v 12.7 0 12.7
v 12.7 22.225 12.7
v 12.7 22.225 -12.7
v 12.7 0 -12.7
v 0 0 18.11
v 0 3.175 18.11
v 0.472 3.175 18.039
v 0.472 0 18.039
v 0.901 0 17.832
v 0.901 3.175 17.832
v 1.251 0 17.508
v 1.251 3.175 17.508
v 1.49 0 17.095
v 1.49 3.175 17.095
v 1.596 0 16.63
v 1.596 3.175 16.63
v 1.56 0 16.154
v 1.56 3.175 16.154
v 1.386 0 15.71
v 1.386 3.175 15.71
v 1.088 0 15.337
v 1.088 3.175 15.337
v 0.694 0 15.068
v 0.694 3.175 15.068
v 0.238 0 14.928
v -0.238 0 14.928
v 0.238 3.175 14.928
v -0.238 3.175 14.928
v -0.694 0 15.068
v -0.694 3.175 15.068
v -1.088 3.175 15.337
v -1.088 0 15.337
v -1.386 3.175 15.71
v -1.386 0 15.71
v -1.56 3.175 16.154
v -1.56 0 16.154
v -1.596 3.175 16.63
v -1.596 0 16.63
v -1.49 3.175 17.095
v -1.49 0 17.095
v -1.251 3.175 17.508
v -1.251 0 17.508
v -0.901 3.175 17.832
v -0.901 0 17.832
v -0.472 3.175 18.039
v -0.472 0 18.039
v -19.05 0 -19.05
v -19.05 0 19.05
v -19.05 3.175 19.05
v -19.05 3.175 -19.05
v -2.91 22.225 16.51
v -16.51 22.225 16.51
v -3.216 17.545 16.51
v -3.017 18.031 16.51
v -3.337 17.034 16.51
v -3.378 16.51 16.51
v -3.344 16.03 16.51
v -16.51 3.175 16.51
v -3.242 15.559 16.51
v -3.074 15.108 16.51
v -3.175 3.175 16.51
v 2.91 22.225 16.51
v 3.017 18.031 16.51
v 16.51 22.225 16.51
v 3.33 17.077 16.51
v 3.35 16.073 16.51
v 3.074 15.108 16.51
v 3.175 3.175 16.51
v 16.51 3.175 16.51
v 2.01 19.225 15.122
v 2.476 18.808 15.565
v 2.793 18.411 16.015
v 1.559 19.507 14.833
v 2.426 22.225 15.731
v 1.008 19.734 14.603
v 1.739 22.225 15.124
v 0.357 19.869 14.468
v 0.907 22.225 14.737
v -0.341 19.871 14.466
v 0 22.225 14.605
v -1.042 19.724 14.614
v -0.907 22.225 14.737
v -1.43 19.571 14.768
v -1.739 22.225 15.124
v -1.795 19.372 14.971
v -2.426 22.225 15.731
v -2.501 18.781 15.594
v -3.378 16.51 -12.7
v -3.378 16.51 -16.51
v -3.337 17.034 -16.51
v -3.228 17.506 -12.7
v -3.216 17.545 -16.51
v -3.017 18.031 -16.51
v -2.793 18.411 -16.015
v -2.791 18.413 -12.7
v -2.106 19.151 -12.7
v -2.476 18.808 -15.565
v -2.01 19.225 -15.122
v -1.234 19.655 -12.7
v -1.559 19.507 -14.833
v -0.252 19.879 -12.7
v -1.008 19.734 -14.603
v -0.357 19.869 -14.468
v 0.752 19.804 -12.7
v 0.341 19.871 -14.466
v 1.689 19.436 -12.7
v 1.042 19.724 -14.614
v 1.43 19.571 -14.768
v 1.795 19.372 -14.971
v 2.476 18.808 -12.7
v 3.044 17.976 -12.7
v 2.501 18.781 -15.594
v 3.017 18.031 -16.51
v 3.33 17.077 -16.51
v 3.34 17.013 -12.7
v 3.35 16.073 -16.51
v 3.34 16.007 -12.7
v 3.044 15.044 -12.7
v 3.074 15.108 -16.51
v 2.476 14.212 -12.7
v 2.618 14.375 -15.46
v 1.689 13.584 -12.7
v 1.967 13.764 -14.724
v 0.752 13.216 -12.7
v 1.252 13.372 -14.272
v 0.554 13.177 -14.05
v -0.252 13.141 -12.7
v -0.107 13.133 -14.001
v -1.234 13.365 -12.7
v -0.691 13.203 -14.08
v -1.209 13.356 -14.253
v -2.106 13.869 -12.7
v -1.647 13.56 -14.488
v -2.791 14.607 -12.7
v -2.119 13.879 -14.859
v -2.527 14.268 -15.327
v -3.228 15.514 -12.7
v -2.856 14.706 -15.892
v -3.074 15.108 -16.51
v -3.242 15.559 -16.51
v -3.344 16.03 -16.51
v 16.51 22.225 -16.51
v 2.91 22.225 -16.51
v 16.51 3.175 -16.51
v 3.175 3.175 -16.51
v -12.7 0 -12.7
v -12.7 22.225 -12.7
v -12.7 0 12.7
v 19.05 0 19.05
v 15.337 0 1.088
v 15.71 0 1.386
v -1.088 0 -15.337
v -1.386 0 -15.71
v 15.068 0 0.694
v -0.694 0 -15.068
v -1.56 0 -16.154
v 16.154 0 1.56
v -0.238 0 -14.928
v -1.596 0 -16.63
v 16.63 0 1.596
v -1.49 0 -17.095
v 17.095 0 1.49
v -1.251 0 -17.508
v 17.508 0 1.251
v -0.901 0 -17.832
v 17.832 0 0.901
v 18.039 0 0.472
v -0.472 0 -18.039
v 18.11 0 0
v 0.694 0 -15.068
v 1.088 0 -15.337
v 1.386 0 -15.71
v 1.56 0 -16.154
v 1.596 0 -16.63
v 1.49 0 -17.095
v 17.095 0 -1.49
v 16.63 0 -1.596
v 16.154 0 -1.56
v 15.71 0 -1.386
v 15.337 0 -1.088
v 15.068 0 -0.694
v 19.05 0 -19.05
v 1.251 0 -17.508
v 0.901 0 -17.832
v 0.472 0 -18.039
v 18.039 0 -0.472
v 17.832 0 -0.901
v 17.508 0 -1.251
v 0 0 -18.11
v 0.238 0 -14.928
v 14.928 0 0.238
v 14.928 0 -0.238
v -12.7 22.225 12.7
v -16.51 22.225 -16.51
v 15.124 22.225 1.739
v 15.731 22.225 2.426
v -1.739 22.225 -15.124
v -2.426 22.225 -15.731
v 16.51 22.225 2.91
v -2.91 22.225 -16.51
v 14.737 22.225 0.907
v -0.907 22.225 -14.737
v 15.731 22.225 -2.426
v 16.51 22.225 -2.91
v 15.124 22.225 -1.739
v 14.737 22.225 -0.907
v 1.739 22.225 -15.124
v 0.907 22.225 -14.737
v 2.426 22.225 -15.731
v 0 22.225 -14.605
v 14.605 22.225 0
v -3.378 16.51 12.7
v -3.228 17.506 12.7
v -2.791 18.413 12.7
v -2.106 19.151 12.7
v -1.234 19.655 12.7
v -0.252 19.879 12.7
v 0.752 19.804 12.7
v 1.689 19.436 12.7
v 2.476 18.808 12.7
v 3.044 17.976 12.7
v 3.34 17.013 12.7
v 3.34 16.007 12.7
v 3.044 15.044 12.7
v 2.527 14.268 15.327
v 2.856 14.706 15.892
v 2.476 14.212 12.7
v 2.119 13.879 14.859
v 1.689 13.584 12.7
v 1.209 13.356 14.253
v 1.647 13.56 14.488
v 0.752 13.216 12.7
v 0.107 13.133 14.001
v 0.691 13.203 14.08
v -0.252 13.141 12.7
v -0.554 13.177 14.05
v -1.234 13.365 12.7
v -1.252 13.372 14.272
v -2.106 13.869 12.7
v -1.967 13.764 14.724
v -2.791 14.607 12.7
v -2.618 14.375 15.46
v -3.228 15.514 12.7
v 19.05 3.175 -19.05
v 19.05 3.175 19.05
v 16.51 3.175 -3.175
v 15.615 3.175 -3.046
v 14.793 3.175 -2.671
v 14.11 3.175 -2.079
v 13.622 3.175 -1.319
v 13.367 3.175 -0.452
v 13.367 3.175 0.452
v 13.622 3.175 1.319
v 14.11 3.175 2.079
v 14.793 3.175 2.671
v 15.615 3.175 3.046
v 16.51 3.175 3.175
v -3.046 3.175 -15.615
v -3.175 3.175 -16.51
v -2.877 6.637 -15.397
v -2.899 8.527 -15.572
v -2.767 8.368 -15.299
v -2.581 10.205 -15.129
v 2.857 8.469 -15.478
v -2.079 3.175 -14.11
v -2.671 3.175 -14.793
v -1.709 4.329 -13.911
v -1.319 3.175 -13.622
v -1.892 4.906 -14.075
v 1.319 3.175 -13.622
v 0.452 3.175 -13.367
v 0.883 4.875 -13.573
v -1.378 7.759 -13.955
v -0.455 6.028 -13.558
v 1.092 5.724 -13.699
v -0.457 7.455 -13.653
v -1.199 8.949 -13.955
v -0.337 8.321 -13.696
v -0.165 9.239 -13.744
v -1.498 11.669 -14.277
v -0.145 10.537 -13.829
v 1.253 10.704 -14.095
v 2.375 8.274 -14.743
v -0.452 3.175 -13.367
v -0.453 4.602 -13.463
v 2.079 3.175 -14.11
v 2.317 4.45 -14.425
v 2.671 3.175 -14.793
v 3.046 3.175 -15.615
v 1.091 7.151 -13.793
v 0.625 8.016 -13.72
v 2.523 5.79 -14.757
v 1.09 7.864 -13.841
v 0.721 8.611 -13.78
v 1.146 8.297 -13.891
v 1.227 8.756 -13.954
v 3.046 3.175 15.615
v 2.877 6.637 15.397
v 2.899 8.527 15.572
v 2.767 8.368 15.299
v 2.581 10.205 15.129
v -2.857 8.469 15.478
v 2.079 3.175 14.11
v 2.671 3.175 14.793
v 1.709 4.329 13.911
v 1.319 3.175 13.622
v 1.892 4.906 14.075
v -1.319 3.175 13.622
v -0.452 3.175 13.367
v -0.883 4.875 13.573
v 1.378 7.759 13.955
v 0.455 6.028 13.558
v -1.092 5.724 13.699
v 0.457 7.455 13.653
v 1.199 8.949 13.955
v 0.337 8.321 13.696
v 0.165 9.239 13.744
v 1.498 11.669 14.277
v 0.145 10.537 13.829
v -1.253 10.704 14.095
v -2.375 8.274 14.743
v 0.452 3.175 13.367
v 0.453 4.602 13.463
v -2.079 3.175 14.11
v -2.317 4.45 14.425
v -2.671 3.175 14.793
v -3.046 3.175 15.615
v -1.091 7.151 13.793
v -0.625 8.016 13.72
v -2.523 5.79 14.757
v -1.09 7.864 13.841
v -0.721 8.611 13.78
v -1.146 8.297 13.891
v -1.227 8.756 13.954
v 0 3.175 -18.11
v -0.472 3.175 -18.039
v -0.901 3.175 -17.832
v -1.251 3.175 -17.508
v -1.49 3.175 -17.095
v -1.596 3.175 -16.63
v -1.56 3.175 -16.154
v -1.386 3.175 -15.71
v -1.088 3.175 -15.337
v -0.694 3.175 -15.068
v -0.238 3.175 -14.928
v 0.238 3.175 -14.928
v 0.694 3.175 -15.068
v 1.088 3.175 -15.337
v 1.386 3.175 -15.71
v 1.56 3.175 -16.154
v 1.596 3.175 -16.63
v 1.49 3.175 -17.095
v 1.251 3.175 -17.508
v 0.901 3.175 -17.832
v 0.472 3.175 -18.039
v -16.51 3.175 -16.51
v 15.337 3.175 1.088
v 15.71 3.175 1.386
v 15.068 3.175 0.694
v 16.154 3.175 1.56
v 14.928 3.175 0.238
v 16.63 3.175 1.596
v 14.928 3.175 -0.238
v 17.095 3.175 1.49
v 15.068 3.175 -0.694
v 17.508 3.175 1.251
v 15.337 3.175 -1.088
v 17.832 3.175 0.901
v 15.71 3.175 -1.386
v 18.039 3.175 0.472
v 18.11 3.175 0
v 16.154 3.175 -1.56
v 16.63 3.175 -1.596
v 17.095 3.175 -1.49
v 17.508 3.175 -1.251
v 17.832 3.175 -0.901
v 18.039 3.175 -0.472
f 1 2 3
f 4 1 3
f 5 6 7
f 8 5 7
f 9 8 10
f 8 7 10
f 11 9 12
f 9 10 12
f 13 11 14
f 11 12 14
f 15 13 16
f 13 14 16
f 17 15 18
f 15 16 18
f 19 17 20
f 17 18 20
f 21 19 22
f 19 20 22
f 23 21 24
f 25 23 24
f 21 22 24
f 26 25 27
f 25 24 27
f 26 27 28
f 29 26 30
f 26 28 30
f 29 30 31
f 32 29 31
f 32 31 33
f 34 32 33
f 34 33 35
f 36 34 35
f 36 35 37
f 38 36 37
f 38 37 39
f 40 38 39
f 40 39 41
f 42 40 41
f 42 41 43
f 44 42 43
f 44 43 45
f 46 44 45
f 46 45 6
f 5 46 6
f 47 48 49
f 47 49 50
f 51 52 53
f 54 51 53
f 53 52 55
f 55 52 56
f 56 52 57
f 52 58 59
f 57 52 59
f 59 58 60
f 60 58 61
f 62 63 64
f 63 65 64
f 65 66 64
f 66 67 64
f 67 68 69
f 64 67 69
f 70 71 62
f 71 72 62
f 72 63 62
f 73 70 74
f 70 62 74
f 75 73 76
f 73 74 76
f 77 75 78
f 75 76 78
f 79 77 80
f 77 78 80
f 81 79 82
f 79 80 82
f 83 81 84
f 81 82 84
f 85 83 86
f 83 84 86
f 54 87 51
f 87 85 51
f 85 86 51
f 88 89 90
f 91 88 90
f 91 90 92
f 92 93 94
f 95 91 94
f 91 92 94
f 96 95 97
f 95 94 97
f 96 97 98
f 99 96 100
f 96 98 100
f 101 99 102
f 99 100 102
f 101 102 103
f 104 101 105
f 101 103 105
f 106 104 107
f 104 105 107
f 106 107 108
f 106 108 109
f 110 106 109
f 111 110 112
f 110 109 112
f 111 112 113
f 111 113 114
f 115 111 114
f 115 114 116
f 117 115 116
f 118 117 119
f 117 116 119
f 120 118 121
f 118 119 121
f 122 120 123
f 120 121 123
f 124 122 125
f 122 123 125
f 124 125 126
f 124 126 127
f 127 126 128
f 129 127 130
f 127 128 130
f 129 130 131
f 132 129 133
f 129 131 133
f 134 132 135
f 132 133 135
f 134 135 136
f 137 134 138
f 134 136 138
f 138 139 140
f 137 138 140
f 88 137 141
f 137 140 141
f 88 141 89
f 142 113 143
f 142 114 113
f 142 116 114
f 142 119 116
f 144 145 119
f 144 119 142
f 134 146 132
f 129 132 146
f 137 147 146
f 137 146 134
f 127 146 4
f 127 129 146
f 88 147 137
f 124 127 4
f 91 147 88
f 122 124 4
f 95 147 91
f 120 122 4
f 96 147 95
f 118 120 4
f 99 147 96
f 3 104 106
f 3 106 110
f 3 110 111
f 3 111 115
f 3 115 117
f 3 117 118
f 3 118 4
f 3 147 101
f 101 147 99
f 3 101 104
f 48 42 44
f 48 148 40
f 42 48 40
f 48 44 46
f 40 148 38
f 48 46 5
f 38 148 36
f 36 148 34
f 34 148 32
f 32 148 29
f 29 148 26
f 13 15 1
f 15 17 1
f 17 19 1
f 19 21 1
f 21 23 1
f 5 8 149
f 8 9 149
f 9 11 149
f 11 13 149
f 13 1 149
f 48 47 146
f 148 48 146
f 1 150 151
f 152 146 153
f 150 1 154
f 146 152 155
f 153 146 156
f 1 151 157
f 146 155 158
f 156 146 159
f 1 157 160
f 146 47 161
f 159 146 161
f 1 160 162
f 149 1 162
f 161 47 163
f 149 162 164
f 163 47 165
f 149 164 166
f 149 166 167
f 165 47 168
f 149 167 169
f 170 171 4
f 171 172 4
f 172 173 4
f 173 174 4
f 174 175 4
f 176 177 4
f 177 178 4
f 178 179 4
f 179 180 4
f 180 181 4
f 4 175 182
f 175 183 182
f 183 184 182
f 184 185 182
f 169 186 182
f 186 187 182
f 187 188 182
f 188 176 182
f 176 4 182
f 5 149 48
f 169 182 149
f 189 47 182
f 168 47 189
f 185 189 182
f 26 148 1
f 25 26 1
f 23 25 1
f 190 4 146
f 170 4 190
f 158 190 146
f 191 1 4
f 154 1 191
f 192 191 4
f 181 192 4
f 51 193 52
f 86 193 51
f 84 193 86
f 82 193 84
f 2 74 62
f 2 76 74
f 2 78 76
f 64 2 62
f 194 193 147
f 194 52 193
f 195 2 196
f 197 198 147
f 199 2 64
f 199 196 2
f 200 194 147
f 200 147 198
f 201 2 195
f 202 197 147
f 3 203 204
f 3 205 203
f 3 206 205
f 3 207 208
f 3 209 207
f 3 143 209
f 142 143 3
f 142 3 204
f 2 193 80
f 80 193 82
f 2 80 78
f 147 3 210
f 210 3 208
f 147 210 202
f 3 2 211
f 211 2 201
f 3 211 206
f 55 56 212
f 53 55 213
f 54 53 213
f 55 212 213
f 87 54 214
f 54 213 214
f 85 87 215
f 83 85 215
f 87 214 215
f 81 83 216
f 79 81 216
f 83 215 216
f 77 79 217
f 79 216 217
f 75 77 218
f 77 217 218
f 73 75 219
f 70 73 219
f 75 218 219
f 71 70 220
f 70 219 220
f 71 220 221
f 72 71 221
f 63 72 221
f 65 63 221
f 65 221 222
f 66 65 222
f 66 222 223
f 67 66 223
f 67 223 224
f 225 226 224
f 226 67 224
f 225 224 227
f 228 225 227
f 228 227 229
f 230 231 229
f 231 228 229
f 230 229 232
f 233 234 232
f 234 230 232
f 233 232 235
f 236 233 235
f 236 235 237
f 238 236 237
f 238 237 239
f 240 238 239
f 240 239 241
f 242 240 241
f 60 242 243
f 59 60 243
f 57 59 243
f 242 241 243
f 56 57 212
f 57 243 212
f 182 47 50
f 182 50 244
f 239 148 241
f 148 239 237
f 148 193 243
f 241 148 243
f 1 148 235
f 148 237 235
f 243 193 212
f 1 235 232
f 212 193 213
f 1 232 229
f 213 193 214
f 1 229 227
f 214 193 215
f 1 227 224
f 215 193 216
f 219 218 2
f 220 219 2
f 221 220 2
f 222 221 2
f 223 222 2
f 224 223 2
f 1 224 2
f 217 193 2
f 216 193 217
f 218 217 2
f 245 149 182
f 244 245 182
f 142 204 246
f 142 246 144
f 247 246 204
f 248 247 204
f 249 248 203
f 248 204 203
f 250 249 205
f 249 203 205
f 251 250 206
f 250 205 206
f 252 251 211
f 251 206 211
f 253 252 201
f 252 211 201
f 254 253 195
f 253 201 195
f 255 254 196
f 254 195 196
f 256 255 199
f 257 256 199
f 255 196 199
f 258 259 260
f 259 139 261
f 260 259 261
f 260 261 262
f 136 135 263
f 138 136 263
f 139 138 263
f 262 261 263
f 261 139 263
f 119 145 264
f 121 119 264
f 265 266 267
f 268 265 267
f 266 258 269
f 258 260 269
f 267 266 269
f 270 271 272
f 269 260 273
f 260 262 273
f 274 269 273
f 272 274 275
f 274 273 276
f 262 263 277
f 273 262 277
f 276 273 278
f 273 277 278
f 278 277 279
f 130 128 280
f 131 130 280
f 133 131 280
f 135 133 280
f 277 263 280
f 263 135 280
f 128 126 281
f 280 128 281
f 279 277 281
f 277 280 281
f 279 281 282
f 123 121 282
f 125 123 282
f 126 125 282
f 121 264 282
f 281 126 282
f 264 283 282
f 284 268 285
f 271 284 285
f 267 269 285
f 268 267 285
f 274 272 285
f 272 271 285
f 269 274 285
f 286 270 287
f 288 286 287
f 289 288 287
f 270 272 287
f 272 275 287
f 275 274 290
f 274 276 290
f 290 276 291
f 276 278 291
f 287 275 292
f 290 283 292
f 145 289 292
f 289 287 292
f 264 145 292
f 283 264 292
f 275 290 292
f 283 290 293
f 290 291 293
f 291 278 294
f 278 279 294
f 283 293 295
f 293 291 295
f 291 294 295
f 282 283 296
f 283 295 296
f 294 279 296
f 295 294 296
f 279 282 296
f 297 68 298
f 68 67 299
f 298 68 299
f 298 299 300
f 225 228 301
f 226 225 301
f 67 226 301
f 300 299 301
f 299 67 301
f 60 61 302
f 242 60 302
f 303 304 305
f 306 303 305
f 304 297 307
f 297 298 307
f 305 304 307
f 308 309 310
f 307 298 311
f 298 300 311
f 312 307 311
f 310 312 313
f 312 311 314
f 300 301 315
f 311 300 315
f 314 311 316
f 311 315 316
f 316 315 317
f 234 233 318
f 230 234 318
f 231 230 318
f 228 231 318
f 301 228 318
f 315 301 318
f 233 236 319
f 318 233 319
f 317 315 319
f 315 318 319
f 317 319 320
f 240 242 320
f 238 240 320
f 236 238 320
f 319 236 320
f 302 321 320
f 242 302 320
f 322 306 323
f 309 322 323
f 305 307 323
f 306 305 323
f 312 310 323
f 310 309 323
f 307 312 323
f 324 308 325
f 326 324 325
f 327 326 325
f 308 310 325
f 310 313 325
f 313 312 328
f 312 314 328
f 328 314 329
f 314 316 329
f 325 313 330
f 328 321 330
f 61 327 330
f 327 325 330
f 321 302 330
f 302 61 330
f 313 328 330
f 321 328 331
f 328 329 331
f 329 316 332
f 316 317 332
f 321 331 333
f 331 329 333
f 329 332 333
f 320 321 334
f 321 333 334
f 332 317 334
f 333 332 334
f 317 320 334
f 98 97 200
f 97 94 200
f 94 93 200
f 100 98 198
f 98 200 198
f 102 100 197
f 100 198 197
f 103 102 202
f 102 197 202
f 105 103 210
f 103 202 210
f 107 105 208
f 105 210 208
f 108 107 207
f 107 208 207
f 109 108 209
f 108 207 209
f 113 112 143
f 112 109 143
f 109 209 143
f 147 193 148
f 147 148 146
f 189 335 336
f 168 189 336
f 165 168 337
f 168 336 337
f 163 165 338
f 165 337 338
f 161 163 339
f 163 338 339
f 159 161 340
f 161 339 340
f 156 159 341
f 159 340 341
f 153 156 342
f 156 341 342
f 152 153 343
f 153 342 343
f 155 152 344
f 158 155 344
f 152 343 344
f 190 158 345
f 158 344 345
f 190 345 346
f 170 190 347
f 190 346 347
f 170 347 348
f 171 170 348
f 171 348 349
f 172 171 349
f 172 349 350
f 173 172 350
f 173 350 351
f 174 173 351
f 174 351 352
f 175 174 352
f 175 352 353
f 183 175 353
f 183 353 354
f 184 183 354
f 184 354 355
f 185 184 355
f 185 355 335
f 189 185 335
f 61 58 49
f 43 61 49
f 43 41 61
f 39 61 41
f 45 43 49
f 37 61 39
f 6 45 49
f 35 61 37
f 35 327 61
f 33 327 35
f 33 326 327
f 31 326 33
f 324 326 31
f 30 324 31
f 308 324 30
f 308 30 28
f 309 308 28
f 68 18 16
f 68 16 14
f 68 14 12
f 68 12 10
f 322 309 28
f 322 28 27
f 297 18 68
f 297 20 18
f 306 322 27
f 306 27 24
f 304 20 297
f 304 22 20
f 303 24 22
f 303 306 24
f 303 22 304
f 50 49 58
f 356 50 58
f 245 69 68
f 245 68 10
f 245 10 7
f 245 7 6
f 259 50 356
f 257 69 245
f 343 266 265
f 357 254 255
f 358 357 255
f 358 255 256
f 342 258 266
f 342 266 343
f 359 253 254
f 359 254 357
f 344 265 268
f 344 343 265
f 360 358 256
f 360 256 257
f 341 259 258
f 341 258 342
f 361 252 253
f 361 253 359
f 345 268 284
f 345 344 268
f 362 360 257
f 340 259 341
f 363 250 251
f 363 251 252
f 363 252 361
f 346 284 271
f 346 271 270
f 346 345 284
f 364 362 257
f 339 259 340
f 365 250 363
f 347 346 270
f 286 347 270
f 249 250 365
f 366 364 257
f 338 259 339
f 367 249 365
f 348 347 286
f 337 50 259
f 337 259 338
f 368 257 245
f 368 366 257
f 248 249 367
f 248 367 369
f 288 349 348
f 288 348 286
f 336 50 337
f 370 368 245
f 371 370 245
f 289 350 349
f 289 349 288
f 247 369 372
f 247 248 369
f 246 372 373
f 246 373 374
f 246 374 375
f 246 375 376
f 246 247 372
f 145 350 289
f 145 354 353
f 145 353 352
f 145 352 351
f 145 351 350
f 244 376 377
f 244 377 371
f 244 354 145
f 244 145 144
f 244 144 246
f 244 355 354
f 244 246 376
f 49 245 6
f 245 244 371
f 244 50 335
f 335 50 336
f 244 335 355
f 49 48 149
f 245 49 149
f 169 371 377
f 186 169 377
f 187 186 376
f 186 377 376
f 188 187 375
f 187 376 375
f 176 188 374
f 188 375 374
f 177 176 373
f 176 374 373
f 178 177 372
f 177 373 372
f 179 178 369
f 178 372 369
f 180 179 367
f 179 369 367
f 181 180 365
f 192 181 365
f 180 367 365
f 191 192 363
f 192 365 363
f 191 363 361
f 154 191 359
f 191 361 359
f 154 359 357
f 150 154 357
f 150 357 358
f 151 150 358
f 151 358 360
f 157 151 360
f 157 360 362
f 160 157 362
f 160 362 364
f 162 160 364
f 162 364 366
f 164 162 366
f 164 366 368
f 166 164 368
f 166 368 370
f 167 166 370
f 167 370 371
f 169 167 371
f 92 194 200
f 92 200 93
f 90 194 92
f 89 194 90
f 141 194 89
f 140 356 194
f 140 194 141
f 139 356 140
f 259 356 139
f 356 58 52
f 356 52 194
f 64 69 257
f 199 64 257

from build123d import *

# Parameters (mm, degrees)
SKETCH1_W           = 38.1
SKETCH1_H           = 38.1
BOSS_EXTRUDE1_DEPTH = 3.175
SKETCH2_W           = 33.02
SKETCH2_H           = 33.02
BOSS_EXTRUDE2_DEPTH = 19.05
SKETCH3_W           = 25.4
SKETCH3_H           = 25.4
CUT_EXTRUDE1_DEPTH  = 23.225
SKETCH4_R           = 1.6002
CUT_EXTRUDE2_DEPTH  = 4.175
CIRPATTERN1_COUNT   = 4
SKETCH6_R           = 3.3782
CUT_EXTRUDE4_DEPTH  = 36.56
SKETCH10_R          = 3.175
CIRPATTERN3_COUNT   = 4


with BuildPart() as part:
    # Sketch1 → Boss-Extrude1 (new body)
    with BuildSketch(Plane(origin=(0, 0, 0), x_dir=(1, 0, 0), z_dir=(0, 1, 0))):
        Rectangle(SKETCH1_W, SKETCH1_H)
    extrude(amount=BOSS_EXTRUDE1_DEPTH)

    # Sketch2 → Boss-Extrude2 (add)
    with BuildSketch(Plane(origin=(0, 3.175, 0), x_dir=(1, 0, 0), z_dir=(0, 1, 0))):
        Rectangle(SKETCH2_W, SKETCH2_H)
    extrude(amount=BOSS_EXTRUDE2_DEPTH)

    # Sketch3 → Cut-Extrude1 (cut, through all)
    with BuildSketch(Plane(origin=(0, 22.225, 0), x_dir=(1, 0, 0), z_dir=(0, 1, 0))):
        Rectangle(SKETCH3_W, SKETCH3_H)
    extrude(amount=-CUT_EXTRUDE1_DEPTH, mode=Mode.SUBTRACT)

    # Sketch4 → Cut-Extrude2 (cut, through all)
    with BuildSketch(Plane(origin=(0, 3.175, 0), x_dir=(1, 0, 0), z_dir=(0, 1, 0))):
        with Locations((16.51, 0)):
            Circle(SKETCH4_R)
    cut_extrude2 = extrude(amount=-CUT_EXTRUDE2_DEPTH, mode=Mode.SUBTRACT)

    # CirPattern1: Cut-Extrude2 ×4 about axis, 1 skipped
    cirpattern1_axis = Axis((0, 0, 0), (0, 1, 0))
    add([cut_extrude2.rotate(cirpattern1_axis, i * 360 / CIRPATTERN1_COUNT) for i in range(1, CIRPATTERN1_COUNT) if i not in (2,)], mode=Mode.SUBTRACT)

    # Sketch6 → Cut-Extrude4 (cut, through all)
    with BuildSketch(Plane(origin=(0, 0, -16.51), x_dir=(-1, 0, 0), z_dir=(0, 0, -1))):
        with Locations((0, 16.51)):
            Circle(SKETCH6_R)
    extrude(amount=-CUT_EXTRUDE4_DEPTH, mode=Mode.SUBTRACT)

    # Cut-Sweep2: sweep along a path in Sketch9
    with BuildLine(Plane.XY) as cut_sweep2_path:
        Line((16.51, 3.175), (17.78, 22.225))
    # Sketch10 → Cut-Sweep2 (sweep, cut)
    with BuildSketch(Plane(origin=(0, 3.175, 0), x_dir=(1, 0, 0), z_dir=(0, 1, 0))):
        with Locations((16.51, 0)):
            Circle(SKETCH10_R)
    cut_sweep2 = sweep(path=cut_sweep2_path.line, mode=Mode.SUBTRACT)

    # CirPattern3: Cut-Sweep2 ×4 about axis, 1 skipped
    cirpattern3_axis = Axis((0, -1.42875, 0), (0, 1, 0))
    add([cut_sweep2.rotate(cirpattern3_axis, i * 360 / CIRPATTERN3_COUNT) for i in range(1, CIRPATTERN3_COUNT) if i not in (2,)], mode=Mode.SUBTRACT)


solid = part.part
